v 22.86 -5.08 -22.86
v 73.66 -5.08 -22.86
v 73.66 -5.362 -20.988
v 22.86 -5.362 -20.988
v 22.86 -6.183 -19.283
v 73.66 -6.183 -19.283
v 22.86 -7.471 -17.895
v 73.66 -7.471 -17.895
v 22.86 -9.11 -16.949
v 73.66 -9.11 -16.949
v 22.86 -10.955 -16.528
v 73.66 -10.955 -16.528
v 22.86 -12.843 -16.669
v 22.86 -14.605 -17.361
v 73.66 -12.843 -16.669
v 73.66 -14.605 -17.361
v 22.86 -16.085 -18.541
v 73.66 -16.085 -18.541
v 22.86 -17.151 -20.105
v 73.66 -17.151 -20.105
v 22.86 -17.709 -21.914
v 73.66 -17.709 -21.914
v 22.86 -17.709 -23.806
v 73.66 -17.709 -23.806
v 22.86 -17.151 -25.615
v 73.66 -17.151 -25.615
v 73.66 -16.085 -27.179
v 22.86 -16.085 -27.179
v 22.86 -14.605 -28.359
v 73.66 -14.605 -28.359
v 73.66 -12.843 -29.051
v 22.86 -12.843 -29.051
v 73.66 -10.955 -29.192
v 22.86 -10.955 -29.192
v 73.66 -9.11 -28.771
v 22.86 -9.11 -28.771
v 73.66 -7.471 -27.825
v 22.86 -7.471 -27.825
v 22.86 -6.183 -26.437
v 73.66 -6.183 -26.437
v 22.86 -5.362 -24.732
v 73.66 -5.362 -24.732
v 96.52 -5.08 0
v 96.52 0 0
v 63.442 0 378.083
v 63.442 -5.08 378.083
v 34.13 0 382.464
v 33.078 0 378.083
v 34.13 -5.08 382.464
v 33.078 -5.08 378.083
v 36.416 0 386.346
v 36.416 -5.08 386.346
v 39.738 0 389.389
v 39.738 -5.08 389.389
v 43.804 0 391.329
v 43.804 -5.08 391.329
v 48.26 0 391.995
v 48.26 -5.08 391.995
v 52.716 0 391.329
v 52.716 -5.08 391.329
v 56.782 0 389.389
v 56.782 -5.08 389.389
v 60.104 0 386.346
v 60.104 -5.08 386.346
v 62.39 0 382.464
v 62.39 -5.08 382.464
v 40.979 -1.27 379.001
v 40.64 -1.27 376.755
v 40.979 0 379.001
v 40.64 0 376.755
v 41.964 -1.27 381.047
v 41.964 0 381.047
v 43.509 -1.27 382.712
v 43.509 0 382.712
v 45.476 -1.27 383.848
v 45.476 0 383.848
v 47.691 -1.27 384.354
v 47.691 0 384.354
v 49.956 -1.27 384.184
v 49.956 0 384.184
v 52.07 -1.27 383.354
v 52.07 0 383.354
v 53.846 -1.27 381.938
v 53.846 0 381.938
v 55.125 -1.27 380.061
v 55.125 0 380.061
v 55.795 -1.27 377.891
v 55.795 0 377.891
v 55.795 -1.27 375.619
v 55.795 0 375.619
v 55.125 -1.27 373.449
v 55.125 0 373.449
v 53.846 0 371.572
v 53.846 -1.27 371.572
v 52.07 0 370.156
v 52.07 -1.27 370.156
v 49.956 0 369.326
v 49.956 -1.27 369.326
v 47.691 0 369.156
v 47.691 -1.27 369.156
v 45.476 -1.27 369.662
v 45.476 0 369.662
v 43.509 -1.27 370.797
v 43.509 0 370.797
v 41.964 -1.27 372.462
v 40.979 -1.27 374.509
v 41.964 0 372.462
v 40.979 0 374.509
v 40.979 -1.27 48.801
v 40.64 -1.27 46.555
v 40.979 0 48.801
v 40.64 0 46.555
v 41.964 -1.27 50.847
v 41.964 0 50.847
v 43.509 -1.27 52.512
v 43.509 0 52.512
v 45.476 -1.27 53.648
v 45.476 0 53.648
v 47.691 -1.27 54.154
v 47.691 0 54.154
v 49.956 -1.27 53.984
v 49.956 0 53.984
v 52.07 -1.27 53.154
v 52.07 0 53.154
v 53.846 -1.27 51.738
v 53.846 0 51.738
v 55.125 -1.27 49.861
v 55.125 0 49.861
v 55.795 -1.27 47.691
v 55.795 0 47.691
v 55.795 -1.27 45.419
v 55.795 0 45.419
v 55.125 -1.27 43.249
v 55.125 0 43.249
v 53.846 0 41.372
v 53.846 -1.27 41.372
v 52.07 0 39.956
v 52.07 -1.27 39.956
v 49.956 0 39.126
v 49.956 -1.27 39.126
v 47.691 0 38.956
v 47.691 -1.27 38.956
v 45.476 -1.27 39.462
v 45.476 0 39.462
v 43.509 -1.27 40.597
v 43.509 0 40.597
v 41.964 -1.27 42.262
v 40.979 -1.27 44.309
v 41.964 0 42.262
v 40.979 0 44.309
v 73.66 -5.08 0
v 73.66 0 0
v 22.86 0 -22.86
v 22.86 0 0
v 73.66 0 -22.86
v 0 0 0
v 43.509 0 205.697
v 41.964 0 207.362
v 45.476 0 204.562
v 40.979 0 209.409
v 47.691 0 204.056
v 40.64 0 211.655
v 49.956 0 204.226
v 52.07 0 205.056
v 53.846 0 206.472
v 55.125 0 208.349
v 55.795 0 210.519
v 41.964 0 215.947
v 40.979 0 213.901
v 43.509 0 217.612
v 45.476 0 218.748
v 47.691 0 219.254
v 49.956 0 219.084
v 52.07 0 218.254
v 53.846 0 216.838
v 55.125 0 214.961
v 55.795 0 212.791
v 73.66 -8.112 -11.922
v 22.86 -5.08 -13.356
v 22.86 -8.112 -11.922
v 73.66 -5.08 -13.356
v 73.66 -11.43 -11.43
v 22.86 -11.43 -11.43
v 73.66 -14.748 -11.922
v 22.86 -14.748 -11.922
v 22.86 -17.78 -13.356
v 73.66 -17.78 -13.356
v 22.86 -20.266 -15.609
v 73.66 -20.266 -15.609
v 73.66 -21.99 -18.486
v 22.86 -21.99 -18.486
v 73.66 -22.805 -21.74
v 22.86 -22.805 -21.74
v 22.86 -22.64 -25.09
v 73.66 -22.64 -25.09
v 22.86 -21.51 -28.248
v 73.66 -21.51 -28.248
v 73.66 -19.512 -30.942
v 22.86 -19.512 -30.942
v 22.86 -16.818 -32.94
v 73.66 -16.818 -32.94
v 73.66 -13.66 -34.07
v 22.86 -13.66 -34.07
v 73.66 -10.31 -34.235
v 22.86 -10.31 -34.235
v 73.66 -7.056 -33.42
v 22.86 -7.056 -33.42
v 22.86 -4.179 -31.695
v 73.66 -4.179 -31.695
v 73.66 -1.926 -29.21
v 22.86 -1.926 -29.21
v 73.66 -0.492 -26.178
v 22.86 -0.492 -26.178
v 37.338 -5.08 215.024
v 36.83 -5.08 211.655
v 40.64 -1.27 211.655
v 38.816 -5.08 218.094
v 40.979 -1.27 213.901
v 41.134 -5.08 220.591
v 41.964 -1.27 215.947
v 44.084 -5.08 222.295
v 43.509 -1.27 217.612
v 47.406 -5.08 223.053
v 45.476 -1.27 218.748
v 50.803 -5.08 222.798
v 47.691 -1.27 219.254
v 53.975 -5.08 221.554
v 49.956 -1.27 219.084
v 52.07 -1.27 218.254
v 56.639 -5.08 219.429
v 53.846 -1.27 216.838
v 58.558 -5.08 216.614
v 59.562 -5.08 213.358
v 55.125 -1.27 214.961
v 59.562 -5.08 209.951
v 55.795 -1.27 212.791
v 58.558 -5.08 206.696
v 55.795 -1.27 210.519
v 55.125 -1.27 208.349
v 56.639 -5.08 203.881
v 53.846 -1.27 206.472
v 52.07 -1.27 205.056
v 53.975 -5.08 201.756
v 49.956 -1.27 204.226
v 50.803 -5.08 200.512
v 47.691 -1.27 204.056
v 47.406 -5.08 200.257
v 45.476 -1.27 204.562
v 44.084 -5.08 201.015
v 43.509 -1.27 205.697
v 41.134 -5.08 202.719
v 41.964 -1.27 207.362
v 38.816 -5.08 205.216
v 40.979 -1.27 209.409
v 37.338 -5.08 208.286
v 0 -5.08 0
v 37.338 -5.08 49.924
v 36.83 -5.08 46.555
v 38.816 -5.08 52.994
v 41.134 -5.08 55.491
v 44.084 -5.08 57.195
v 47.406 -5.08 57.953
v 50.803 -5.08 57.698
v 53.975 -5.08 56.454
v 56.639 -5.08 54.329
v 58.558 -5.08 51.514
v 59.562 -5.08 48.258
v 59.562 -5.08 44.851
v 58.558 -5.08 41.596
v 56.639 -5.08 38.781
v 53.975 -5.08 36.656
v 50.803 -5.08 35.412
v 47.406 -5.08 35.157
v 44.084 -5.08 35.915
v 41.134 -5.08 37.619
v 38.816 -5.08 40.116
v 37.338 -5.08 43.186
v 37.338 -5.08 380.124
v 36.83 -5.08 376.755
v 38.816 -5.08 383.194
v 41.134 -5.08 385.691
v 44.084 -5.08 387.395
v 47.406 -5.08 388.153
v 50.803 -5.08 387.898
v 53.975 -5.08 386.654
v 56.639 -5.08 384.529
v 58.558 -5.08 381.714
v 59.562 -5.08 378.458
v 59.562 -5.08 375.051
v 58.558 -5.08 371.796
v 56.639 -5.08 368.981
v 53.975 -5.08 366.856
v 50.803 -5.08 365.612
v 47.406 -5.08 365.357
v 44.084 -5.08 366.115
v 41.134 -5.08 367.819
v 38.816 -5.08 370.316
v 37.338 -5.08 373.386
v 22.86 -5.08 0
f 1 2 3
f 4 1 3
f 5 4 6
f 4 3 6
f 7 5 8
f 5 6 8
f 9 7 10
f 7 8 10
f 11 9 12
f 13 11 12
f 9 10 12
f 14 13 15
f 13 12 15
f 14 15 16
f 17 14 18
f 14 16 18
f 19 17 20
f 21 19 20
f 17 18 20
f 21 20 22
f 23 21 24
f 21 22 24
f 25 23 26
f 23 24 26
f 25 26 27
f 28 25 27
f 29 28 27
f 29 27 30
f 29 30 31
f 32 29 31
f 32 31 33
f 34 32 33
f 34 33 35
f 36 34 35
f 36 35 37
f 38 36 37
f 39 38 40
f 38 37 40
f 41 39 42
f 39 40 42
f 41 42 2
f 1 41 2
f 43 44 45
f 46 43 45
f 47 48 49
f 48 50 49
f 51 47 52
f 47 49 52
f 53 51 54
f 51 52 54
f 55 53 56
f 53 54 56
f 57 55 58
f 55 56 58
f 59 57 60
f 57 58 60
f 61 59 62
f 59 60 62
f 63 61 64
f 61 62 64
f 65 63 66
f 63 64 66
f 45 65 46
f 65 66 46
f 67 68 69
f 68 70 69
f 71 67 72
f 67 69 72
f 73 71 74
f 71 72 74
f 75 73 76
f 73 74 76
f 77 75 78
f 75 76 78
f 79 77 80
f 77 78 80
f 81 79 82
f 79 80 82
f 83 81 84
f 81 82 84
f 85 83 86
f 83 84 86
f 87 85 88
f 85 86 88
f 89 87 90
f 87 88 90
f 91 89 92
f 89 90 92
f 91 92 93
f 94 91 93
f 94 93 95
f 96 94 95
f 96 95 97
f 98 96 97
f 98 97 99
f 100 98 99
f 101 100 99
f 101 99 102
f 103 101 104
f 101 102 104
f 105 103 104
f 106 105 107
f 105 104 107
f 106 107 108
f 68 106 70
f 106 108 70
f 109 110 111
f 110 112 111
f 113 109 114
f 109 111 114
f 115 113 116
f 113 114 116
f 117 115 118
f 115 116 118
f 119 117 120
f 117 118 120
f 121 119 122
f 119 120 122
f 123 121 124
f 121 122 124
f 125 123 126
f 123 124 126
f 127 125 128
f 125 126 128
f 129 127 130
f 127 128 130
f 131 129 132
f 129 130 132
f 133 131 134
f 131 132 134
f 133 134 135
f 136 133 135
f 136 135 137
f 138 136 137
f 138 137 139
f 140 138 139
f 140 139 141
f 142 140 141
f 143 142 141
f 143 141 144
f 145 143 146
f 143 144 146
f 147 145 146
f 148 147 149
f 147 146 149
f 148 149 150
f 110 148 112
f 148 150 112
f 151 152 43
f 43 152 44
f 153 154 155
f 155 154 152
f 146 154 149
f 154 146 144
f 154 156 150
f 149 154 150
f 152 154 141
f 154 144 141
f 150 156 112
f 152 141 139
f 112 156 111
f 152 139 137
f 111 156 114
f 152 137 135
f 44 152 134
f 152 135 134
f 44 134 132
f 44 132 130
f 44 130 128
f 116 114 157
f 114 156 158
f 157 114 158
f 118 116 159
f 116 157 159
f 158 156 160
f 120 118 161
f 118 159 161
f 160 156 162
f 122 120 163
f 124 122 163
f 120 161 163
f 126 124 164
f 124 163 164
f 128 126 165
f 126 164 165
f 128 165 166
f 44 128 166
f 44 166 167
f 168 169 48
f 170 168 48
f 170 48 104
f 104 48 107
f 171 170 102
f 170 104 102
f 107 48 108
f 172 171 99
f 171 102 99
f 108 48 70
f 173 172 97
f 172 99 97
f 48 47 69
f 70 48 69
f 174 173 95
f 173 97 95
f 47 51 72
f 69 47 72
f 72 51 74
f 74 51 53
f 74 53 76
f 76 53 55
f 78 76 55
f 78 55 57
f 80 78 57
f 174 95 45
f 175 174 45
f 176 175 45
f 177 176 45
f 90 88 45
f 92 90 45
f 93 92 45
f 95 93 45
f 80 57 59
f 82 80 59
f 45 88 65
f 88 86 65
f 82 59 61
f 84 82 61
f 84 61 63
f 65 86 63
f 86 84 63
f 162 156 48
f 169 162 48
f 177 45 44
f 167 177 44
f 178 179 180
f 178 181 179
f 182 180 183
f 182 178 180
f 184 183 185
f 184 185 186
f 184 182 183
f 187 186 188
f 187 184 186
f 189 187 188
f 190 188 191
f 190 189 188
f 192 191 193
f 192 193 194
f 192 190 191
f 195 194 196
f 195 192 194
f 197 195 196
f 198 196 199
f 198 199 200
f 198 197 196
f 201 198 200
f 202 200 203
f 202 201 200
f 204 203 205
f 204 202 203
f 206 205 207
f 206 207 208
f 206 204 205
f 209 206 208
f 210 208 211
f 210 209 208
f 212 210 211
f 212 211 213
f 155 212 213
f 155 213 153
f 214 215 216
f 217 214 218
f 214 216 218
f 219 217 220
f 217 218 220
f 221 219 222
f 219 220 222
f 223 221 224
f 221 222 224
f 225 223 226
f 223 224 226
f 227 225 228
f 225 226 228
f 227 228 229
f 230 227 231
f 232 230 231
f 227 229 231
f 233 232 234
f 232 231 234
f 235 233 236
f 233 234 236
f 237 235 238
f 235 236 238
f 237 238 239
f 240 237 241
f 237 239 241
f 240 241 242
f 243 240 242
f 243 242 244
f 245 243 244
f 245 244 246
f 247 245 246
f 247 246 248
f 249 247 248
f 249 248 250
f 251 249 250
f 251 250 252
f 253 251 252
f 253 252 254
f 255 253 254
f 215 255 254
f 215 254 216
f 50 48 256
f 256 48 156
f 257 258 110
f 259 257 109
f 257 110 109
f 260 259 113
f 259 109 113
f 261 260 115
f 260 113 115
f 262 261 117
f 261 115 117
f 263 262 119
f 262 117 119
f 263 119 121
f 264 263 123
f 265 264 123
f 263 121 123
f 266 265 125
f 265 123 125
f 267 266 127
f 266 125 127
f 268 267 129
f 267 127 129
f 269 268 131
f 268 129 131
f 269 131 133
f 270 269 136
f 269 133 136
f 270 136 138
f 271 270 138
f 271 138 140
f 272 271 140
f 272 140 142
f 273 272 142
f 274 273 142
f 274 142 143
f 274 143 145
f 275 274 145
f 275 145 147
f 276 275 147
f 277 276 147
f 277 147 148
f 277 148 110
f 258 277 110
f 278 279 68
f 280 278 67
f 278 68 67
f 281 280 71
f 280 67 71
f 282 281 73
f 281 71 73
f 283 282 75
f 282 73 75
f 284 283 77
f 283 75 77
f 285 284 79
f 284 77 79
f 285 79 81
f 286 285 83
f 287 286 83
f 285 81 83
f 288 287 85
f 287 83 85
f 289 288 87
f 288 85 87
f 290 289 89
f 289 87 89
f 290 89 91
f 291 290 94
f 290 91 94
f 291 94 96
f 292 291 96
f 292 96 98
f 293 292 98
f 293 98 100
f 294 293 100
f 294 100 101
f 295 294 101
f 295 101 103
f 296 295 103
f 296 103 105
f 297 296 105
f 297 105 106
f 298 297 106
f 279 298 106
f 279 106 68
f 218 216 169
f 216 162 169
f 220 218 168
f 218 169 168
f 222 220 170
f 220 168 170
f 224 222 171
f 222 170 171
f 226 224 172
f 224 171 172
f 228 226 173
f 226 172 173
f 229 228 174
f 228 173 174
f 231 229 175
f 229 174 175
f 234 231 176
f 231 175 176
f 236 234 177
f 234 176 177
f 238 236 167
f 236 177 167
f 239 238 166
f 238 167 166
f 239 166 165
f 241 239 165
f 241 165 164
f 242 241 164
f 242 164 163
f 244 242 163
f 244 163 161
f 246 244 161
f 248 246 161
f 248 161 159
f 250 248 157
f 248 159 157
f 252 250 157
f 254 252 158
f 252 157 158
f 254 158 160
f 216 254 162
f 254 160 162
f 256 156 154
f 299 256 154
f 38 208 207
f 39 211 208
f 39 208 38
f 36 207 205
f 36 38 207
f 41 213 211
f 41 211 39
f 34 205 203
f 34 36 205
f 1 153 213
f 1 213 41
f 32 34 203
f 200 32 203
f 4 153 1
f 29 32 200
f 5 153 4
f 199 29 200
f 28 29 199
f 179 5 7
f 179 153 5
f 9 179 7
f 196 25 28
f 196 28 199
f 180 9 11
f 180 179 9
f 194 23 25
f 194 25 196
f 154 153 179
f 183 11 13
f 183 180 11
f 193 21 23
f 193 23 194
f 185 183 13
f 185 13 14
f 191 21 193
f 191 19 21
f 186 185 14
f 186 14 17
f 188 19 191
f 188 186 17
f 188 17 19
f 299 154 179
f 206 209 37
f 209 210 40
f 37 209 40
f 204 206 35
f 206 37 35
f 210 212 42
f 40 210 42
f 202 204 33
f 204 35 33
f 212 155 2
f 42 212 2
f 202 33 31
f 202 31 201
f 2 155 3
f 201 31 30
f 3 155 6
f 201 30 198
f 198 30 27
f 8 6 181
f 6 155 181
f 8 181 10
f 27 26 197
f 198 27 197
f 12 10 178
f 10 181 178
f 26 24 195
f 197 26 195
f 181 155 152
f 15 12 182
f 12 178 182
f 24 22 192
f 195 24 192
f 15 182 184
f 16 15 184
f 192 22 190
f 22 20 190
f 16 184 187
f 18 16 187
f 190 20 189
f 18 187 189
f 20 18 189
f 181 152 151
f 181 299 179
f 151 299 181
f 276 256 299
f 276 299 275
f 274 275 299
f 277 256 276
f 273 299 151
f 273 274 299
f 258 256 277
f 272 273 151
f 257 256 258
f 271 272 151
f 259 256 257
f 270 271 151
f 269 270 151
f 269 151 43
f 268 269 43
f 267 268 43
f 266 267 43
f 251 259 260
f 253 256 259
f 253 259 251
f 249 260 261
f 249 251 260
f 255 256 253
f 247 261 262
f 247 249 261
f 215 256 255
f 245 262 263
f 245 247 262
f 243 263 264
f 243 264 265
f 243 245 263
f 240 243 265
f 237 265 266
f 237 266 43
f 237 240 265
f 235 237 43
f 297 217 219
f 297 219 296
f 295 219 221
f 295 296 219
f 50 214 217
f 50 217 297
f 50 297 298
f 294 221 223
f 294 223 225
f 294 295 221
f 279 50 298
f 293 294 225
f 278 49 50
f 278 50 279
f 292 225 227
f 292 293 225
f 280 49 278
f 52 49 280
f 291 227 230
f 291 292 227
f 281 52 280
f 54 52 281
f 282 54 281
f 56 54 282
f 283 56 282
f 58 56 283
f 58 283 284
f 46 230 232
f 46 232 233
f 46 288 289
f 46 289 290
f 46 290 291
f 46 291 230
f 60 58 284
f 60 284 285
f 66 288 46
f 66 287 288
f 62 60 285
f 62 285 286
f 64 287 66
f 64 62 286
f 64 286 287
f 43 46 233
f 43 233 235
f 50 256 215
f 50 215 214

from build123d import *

# Parameters (mm, degrees)
F1_DEPTH       = 5.08
F2_W           = 50.8
F2_H           = 5.08
F3_DEPTH       = 22.86
F4_W           = 50.8
F4_H           = 5.08
F6_R           = 15.24
F8_D           = 15.24
F8_CSINK_D     = 22.86
F8_CSINK_ANGLE = 90


with BuildPart() as f1:
    # F0 (on Front) → F1 (new body)
    with BuildSketch(Plane.XZ):
        Polygon((48.26, 551.614324), (0, 0), (96.52, 0), align=None)
    extrude(amount=F1_DEPTH)

    # F2 (on face) → F3 (join)
    with BuildSketch(Plane(origin=(0, 0, 0), x_dir=(1, 0, 0), z_dir=(0, 0, -1))):
        with Locations((48.26, 2.54)):
            Rectangle(F2_W, F2_H)
    extrude(amount=F3_DEPTH)

    # F4 (on face) → F5 (revolve)
    with BuildSketch(Plane(origin=(0, 0, -22.86), x_dir=(1, 0, 0), z_dir=(0, 0, -1))):
        with Locations((48.26, 2.54)):
            Rectangle(F4_W, F4_H)
    revolve(axis=Axis((35.56, -11.43, -22.86), (1, 0, 0)))

    # F6
    f6_edges = [f1.edges().sort_by_distance(p)[0] for p in [
        (48.26, -2.54, 551.614324),
    ]]
    fillet(f6_edges, radius=F6_R)

    # F8 (through all)
    with Locations(Plane.XZ.offset(5.08)):
        with Locations((48.26, 46.554934), (48.26, 211.654934), (48.26, 376.754934)):
            CounterSinkHole(F8_D / 2, F8_CSINK_D / 2, counter_sink_angle=F8_CSINK_ANGLE)


solid = f1.part
